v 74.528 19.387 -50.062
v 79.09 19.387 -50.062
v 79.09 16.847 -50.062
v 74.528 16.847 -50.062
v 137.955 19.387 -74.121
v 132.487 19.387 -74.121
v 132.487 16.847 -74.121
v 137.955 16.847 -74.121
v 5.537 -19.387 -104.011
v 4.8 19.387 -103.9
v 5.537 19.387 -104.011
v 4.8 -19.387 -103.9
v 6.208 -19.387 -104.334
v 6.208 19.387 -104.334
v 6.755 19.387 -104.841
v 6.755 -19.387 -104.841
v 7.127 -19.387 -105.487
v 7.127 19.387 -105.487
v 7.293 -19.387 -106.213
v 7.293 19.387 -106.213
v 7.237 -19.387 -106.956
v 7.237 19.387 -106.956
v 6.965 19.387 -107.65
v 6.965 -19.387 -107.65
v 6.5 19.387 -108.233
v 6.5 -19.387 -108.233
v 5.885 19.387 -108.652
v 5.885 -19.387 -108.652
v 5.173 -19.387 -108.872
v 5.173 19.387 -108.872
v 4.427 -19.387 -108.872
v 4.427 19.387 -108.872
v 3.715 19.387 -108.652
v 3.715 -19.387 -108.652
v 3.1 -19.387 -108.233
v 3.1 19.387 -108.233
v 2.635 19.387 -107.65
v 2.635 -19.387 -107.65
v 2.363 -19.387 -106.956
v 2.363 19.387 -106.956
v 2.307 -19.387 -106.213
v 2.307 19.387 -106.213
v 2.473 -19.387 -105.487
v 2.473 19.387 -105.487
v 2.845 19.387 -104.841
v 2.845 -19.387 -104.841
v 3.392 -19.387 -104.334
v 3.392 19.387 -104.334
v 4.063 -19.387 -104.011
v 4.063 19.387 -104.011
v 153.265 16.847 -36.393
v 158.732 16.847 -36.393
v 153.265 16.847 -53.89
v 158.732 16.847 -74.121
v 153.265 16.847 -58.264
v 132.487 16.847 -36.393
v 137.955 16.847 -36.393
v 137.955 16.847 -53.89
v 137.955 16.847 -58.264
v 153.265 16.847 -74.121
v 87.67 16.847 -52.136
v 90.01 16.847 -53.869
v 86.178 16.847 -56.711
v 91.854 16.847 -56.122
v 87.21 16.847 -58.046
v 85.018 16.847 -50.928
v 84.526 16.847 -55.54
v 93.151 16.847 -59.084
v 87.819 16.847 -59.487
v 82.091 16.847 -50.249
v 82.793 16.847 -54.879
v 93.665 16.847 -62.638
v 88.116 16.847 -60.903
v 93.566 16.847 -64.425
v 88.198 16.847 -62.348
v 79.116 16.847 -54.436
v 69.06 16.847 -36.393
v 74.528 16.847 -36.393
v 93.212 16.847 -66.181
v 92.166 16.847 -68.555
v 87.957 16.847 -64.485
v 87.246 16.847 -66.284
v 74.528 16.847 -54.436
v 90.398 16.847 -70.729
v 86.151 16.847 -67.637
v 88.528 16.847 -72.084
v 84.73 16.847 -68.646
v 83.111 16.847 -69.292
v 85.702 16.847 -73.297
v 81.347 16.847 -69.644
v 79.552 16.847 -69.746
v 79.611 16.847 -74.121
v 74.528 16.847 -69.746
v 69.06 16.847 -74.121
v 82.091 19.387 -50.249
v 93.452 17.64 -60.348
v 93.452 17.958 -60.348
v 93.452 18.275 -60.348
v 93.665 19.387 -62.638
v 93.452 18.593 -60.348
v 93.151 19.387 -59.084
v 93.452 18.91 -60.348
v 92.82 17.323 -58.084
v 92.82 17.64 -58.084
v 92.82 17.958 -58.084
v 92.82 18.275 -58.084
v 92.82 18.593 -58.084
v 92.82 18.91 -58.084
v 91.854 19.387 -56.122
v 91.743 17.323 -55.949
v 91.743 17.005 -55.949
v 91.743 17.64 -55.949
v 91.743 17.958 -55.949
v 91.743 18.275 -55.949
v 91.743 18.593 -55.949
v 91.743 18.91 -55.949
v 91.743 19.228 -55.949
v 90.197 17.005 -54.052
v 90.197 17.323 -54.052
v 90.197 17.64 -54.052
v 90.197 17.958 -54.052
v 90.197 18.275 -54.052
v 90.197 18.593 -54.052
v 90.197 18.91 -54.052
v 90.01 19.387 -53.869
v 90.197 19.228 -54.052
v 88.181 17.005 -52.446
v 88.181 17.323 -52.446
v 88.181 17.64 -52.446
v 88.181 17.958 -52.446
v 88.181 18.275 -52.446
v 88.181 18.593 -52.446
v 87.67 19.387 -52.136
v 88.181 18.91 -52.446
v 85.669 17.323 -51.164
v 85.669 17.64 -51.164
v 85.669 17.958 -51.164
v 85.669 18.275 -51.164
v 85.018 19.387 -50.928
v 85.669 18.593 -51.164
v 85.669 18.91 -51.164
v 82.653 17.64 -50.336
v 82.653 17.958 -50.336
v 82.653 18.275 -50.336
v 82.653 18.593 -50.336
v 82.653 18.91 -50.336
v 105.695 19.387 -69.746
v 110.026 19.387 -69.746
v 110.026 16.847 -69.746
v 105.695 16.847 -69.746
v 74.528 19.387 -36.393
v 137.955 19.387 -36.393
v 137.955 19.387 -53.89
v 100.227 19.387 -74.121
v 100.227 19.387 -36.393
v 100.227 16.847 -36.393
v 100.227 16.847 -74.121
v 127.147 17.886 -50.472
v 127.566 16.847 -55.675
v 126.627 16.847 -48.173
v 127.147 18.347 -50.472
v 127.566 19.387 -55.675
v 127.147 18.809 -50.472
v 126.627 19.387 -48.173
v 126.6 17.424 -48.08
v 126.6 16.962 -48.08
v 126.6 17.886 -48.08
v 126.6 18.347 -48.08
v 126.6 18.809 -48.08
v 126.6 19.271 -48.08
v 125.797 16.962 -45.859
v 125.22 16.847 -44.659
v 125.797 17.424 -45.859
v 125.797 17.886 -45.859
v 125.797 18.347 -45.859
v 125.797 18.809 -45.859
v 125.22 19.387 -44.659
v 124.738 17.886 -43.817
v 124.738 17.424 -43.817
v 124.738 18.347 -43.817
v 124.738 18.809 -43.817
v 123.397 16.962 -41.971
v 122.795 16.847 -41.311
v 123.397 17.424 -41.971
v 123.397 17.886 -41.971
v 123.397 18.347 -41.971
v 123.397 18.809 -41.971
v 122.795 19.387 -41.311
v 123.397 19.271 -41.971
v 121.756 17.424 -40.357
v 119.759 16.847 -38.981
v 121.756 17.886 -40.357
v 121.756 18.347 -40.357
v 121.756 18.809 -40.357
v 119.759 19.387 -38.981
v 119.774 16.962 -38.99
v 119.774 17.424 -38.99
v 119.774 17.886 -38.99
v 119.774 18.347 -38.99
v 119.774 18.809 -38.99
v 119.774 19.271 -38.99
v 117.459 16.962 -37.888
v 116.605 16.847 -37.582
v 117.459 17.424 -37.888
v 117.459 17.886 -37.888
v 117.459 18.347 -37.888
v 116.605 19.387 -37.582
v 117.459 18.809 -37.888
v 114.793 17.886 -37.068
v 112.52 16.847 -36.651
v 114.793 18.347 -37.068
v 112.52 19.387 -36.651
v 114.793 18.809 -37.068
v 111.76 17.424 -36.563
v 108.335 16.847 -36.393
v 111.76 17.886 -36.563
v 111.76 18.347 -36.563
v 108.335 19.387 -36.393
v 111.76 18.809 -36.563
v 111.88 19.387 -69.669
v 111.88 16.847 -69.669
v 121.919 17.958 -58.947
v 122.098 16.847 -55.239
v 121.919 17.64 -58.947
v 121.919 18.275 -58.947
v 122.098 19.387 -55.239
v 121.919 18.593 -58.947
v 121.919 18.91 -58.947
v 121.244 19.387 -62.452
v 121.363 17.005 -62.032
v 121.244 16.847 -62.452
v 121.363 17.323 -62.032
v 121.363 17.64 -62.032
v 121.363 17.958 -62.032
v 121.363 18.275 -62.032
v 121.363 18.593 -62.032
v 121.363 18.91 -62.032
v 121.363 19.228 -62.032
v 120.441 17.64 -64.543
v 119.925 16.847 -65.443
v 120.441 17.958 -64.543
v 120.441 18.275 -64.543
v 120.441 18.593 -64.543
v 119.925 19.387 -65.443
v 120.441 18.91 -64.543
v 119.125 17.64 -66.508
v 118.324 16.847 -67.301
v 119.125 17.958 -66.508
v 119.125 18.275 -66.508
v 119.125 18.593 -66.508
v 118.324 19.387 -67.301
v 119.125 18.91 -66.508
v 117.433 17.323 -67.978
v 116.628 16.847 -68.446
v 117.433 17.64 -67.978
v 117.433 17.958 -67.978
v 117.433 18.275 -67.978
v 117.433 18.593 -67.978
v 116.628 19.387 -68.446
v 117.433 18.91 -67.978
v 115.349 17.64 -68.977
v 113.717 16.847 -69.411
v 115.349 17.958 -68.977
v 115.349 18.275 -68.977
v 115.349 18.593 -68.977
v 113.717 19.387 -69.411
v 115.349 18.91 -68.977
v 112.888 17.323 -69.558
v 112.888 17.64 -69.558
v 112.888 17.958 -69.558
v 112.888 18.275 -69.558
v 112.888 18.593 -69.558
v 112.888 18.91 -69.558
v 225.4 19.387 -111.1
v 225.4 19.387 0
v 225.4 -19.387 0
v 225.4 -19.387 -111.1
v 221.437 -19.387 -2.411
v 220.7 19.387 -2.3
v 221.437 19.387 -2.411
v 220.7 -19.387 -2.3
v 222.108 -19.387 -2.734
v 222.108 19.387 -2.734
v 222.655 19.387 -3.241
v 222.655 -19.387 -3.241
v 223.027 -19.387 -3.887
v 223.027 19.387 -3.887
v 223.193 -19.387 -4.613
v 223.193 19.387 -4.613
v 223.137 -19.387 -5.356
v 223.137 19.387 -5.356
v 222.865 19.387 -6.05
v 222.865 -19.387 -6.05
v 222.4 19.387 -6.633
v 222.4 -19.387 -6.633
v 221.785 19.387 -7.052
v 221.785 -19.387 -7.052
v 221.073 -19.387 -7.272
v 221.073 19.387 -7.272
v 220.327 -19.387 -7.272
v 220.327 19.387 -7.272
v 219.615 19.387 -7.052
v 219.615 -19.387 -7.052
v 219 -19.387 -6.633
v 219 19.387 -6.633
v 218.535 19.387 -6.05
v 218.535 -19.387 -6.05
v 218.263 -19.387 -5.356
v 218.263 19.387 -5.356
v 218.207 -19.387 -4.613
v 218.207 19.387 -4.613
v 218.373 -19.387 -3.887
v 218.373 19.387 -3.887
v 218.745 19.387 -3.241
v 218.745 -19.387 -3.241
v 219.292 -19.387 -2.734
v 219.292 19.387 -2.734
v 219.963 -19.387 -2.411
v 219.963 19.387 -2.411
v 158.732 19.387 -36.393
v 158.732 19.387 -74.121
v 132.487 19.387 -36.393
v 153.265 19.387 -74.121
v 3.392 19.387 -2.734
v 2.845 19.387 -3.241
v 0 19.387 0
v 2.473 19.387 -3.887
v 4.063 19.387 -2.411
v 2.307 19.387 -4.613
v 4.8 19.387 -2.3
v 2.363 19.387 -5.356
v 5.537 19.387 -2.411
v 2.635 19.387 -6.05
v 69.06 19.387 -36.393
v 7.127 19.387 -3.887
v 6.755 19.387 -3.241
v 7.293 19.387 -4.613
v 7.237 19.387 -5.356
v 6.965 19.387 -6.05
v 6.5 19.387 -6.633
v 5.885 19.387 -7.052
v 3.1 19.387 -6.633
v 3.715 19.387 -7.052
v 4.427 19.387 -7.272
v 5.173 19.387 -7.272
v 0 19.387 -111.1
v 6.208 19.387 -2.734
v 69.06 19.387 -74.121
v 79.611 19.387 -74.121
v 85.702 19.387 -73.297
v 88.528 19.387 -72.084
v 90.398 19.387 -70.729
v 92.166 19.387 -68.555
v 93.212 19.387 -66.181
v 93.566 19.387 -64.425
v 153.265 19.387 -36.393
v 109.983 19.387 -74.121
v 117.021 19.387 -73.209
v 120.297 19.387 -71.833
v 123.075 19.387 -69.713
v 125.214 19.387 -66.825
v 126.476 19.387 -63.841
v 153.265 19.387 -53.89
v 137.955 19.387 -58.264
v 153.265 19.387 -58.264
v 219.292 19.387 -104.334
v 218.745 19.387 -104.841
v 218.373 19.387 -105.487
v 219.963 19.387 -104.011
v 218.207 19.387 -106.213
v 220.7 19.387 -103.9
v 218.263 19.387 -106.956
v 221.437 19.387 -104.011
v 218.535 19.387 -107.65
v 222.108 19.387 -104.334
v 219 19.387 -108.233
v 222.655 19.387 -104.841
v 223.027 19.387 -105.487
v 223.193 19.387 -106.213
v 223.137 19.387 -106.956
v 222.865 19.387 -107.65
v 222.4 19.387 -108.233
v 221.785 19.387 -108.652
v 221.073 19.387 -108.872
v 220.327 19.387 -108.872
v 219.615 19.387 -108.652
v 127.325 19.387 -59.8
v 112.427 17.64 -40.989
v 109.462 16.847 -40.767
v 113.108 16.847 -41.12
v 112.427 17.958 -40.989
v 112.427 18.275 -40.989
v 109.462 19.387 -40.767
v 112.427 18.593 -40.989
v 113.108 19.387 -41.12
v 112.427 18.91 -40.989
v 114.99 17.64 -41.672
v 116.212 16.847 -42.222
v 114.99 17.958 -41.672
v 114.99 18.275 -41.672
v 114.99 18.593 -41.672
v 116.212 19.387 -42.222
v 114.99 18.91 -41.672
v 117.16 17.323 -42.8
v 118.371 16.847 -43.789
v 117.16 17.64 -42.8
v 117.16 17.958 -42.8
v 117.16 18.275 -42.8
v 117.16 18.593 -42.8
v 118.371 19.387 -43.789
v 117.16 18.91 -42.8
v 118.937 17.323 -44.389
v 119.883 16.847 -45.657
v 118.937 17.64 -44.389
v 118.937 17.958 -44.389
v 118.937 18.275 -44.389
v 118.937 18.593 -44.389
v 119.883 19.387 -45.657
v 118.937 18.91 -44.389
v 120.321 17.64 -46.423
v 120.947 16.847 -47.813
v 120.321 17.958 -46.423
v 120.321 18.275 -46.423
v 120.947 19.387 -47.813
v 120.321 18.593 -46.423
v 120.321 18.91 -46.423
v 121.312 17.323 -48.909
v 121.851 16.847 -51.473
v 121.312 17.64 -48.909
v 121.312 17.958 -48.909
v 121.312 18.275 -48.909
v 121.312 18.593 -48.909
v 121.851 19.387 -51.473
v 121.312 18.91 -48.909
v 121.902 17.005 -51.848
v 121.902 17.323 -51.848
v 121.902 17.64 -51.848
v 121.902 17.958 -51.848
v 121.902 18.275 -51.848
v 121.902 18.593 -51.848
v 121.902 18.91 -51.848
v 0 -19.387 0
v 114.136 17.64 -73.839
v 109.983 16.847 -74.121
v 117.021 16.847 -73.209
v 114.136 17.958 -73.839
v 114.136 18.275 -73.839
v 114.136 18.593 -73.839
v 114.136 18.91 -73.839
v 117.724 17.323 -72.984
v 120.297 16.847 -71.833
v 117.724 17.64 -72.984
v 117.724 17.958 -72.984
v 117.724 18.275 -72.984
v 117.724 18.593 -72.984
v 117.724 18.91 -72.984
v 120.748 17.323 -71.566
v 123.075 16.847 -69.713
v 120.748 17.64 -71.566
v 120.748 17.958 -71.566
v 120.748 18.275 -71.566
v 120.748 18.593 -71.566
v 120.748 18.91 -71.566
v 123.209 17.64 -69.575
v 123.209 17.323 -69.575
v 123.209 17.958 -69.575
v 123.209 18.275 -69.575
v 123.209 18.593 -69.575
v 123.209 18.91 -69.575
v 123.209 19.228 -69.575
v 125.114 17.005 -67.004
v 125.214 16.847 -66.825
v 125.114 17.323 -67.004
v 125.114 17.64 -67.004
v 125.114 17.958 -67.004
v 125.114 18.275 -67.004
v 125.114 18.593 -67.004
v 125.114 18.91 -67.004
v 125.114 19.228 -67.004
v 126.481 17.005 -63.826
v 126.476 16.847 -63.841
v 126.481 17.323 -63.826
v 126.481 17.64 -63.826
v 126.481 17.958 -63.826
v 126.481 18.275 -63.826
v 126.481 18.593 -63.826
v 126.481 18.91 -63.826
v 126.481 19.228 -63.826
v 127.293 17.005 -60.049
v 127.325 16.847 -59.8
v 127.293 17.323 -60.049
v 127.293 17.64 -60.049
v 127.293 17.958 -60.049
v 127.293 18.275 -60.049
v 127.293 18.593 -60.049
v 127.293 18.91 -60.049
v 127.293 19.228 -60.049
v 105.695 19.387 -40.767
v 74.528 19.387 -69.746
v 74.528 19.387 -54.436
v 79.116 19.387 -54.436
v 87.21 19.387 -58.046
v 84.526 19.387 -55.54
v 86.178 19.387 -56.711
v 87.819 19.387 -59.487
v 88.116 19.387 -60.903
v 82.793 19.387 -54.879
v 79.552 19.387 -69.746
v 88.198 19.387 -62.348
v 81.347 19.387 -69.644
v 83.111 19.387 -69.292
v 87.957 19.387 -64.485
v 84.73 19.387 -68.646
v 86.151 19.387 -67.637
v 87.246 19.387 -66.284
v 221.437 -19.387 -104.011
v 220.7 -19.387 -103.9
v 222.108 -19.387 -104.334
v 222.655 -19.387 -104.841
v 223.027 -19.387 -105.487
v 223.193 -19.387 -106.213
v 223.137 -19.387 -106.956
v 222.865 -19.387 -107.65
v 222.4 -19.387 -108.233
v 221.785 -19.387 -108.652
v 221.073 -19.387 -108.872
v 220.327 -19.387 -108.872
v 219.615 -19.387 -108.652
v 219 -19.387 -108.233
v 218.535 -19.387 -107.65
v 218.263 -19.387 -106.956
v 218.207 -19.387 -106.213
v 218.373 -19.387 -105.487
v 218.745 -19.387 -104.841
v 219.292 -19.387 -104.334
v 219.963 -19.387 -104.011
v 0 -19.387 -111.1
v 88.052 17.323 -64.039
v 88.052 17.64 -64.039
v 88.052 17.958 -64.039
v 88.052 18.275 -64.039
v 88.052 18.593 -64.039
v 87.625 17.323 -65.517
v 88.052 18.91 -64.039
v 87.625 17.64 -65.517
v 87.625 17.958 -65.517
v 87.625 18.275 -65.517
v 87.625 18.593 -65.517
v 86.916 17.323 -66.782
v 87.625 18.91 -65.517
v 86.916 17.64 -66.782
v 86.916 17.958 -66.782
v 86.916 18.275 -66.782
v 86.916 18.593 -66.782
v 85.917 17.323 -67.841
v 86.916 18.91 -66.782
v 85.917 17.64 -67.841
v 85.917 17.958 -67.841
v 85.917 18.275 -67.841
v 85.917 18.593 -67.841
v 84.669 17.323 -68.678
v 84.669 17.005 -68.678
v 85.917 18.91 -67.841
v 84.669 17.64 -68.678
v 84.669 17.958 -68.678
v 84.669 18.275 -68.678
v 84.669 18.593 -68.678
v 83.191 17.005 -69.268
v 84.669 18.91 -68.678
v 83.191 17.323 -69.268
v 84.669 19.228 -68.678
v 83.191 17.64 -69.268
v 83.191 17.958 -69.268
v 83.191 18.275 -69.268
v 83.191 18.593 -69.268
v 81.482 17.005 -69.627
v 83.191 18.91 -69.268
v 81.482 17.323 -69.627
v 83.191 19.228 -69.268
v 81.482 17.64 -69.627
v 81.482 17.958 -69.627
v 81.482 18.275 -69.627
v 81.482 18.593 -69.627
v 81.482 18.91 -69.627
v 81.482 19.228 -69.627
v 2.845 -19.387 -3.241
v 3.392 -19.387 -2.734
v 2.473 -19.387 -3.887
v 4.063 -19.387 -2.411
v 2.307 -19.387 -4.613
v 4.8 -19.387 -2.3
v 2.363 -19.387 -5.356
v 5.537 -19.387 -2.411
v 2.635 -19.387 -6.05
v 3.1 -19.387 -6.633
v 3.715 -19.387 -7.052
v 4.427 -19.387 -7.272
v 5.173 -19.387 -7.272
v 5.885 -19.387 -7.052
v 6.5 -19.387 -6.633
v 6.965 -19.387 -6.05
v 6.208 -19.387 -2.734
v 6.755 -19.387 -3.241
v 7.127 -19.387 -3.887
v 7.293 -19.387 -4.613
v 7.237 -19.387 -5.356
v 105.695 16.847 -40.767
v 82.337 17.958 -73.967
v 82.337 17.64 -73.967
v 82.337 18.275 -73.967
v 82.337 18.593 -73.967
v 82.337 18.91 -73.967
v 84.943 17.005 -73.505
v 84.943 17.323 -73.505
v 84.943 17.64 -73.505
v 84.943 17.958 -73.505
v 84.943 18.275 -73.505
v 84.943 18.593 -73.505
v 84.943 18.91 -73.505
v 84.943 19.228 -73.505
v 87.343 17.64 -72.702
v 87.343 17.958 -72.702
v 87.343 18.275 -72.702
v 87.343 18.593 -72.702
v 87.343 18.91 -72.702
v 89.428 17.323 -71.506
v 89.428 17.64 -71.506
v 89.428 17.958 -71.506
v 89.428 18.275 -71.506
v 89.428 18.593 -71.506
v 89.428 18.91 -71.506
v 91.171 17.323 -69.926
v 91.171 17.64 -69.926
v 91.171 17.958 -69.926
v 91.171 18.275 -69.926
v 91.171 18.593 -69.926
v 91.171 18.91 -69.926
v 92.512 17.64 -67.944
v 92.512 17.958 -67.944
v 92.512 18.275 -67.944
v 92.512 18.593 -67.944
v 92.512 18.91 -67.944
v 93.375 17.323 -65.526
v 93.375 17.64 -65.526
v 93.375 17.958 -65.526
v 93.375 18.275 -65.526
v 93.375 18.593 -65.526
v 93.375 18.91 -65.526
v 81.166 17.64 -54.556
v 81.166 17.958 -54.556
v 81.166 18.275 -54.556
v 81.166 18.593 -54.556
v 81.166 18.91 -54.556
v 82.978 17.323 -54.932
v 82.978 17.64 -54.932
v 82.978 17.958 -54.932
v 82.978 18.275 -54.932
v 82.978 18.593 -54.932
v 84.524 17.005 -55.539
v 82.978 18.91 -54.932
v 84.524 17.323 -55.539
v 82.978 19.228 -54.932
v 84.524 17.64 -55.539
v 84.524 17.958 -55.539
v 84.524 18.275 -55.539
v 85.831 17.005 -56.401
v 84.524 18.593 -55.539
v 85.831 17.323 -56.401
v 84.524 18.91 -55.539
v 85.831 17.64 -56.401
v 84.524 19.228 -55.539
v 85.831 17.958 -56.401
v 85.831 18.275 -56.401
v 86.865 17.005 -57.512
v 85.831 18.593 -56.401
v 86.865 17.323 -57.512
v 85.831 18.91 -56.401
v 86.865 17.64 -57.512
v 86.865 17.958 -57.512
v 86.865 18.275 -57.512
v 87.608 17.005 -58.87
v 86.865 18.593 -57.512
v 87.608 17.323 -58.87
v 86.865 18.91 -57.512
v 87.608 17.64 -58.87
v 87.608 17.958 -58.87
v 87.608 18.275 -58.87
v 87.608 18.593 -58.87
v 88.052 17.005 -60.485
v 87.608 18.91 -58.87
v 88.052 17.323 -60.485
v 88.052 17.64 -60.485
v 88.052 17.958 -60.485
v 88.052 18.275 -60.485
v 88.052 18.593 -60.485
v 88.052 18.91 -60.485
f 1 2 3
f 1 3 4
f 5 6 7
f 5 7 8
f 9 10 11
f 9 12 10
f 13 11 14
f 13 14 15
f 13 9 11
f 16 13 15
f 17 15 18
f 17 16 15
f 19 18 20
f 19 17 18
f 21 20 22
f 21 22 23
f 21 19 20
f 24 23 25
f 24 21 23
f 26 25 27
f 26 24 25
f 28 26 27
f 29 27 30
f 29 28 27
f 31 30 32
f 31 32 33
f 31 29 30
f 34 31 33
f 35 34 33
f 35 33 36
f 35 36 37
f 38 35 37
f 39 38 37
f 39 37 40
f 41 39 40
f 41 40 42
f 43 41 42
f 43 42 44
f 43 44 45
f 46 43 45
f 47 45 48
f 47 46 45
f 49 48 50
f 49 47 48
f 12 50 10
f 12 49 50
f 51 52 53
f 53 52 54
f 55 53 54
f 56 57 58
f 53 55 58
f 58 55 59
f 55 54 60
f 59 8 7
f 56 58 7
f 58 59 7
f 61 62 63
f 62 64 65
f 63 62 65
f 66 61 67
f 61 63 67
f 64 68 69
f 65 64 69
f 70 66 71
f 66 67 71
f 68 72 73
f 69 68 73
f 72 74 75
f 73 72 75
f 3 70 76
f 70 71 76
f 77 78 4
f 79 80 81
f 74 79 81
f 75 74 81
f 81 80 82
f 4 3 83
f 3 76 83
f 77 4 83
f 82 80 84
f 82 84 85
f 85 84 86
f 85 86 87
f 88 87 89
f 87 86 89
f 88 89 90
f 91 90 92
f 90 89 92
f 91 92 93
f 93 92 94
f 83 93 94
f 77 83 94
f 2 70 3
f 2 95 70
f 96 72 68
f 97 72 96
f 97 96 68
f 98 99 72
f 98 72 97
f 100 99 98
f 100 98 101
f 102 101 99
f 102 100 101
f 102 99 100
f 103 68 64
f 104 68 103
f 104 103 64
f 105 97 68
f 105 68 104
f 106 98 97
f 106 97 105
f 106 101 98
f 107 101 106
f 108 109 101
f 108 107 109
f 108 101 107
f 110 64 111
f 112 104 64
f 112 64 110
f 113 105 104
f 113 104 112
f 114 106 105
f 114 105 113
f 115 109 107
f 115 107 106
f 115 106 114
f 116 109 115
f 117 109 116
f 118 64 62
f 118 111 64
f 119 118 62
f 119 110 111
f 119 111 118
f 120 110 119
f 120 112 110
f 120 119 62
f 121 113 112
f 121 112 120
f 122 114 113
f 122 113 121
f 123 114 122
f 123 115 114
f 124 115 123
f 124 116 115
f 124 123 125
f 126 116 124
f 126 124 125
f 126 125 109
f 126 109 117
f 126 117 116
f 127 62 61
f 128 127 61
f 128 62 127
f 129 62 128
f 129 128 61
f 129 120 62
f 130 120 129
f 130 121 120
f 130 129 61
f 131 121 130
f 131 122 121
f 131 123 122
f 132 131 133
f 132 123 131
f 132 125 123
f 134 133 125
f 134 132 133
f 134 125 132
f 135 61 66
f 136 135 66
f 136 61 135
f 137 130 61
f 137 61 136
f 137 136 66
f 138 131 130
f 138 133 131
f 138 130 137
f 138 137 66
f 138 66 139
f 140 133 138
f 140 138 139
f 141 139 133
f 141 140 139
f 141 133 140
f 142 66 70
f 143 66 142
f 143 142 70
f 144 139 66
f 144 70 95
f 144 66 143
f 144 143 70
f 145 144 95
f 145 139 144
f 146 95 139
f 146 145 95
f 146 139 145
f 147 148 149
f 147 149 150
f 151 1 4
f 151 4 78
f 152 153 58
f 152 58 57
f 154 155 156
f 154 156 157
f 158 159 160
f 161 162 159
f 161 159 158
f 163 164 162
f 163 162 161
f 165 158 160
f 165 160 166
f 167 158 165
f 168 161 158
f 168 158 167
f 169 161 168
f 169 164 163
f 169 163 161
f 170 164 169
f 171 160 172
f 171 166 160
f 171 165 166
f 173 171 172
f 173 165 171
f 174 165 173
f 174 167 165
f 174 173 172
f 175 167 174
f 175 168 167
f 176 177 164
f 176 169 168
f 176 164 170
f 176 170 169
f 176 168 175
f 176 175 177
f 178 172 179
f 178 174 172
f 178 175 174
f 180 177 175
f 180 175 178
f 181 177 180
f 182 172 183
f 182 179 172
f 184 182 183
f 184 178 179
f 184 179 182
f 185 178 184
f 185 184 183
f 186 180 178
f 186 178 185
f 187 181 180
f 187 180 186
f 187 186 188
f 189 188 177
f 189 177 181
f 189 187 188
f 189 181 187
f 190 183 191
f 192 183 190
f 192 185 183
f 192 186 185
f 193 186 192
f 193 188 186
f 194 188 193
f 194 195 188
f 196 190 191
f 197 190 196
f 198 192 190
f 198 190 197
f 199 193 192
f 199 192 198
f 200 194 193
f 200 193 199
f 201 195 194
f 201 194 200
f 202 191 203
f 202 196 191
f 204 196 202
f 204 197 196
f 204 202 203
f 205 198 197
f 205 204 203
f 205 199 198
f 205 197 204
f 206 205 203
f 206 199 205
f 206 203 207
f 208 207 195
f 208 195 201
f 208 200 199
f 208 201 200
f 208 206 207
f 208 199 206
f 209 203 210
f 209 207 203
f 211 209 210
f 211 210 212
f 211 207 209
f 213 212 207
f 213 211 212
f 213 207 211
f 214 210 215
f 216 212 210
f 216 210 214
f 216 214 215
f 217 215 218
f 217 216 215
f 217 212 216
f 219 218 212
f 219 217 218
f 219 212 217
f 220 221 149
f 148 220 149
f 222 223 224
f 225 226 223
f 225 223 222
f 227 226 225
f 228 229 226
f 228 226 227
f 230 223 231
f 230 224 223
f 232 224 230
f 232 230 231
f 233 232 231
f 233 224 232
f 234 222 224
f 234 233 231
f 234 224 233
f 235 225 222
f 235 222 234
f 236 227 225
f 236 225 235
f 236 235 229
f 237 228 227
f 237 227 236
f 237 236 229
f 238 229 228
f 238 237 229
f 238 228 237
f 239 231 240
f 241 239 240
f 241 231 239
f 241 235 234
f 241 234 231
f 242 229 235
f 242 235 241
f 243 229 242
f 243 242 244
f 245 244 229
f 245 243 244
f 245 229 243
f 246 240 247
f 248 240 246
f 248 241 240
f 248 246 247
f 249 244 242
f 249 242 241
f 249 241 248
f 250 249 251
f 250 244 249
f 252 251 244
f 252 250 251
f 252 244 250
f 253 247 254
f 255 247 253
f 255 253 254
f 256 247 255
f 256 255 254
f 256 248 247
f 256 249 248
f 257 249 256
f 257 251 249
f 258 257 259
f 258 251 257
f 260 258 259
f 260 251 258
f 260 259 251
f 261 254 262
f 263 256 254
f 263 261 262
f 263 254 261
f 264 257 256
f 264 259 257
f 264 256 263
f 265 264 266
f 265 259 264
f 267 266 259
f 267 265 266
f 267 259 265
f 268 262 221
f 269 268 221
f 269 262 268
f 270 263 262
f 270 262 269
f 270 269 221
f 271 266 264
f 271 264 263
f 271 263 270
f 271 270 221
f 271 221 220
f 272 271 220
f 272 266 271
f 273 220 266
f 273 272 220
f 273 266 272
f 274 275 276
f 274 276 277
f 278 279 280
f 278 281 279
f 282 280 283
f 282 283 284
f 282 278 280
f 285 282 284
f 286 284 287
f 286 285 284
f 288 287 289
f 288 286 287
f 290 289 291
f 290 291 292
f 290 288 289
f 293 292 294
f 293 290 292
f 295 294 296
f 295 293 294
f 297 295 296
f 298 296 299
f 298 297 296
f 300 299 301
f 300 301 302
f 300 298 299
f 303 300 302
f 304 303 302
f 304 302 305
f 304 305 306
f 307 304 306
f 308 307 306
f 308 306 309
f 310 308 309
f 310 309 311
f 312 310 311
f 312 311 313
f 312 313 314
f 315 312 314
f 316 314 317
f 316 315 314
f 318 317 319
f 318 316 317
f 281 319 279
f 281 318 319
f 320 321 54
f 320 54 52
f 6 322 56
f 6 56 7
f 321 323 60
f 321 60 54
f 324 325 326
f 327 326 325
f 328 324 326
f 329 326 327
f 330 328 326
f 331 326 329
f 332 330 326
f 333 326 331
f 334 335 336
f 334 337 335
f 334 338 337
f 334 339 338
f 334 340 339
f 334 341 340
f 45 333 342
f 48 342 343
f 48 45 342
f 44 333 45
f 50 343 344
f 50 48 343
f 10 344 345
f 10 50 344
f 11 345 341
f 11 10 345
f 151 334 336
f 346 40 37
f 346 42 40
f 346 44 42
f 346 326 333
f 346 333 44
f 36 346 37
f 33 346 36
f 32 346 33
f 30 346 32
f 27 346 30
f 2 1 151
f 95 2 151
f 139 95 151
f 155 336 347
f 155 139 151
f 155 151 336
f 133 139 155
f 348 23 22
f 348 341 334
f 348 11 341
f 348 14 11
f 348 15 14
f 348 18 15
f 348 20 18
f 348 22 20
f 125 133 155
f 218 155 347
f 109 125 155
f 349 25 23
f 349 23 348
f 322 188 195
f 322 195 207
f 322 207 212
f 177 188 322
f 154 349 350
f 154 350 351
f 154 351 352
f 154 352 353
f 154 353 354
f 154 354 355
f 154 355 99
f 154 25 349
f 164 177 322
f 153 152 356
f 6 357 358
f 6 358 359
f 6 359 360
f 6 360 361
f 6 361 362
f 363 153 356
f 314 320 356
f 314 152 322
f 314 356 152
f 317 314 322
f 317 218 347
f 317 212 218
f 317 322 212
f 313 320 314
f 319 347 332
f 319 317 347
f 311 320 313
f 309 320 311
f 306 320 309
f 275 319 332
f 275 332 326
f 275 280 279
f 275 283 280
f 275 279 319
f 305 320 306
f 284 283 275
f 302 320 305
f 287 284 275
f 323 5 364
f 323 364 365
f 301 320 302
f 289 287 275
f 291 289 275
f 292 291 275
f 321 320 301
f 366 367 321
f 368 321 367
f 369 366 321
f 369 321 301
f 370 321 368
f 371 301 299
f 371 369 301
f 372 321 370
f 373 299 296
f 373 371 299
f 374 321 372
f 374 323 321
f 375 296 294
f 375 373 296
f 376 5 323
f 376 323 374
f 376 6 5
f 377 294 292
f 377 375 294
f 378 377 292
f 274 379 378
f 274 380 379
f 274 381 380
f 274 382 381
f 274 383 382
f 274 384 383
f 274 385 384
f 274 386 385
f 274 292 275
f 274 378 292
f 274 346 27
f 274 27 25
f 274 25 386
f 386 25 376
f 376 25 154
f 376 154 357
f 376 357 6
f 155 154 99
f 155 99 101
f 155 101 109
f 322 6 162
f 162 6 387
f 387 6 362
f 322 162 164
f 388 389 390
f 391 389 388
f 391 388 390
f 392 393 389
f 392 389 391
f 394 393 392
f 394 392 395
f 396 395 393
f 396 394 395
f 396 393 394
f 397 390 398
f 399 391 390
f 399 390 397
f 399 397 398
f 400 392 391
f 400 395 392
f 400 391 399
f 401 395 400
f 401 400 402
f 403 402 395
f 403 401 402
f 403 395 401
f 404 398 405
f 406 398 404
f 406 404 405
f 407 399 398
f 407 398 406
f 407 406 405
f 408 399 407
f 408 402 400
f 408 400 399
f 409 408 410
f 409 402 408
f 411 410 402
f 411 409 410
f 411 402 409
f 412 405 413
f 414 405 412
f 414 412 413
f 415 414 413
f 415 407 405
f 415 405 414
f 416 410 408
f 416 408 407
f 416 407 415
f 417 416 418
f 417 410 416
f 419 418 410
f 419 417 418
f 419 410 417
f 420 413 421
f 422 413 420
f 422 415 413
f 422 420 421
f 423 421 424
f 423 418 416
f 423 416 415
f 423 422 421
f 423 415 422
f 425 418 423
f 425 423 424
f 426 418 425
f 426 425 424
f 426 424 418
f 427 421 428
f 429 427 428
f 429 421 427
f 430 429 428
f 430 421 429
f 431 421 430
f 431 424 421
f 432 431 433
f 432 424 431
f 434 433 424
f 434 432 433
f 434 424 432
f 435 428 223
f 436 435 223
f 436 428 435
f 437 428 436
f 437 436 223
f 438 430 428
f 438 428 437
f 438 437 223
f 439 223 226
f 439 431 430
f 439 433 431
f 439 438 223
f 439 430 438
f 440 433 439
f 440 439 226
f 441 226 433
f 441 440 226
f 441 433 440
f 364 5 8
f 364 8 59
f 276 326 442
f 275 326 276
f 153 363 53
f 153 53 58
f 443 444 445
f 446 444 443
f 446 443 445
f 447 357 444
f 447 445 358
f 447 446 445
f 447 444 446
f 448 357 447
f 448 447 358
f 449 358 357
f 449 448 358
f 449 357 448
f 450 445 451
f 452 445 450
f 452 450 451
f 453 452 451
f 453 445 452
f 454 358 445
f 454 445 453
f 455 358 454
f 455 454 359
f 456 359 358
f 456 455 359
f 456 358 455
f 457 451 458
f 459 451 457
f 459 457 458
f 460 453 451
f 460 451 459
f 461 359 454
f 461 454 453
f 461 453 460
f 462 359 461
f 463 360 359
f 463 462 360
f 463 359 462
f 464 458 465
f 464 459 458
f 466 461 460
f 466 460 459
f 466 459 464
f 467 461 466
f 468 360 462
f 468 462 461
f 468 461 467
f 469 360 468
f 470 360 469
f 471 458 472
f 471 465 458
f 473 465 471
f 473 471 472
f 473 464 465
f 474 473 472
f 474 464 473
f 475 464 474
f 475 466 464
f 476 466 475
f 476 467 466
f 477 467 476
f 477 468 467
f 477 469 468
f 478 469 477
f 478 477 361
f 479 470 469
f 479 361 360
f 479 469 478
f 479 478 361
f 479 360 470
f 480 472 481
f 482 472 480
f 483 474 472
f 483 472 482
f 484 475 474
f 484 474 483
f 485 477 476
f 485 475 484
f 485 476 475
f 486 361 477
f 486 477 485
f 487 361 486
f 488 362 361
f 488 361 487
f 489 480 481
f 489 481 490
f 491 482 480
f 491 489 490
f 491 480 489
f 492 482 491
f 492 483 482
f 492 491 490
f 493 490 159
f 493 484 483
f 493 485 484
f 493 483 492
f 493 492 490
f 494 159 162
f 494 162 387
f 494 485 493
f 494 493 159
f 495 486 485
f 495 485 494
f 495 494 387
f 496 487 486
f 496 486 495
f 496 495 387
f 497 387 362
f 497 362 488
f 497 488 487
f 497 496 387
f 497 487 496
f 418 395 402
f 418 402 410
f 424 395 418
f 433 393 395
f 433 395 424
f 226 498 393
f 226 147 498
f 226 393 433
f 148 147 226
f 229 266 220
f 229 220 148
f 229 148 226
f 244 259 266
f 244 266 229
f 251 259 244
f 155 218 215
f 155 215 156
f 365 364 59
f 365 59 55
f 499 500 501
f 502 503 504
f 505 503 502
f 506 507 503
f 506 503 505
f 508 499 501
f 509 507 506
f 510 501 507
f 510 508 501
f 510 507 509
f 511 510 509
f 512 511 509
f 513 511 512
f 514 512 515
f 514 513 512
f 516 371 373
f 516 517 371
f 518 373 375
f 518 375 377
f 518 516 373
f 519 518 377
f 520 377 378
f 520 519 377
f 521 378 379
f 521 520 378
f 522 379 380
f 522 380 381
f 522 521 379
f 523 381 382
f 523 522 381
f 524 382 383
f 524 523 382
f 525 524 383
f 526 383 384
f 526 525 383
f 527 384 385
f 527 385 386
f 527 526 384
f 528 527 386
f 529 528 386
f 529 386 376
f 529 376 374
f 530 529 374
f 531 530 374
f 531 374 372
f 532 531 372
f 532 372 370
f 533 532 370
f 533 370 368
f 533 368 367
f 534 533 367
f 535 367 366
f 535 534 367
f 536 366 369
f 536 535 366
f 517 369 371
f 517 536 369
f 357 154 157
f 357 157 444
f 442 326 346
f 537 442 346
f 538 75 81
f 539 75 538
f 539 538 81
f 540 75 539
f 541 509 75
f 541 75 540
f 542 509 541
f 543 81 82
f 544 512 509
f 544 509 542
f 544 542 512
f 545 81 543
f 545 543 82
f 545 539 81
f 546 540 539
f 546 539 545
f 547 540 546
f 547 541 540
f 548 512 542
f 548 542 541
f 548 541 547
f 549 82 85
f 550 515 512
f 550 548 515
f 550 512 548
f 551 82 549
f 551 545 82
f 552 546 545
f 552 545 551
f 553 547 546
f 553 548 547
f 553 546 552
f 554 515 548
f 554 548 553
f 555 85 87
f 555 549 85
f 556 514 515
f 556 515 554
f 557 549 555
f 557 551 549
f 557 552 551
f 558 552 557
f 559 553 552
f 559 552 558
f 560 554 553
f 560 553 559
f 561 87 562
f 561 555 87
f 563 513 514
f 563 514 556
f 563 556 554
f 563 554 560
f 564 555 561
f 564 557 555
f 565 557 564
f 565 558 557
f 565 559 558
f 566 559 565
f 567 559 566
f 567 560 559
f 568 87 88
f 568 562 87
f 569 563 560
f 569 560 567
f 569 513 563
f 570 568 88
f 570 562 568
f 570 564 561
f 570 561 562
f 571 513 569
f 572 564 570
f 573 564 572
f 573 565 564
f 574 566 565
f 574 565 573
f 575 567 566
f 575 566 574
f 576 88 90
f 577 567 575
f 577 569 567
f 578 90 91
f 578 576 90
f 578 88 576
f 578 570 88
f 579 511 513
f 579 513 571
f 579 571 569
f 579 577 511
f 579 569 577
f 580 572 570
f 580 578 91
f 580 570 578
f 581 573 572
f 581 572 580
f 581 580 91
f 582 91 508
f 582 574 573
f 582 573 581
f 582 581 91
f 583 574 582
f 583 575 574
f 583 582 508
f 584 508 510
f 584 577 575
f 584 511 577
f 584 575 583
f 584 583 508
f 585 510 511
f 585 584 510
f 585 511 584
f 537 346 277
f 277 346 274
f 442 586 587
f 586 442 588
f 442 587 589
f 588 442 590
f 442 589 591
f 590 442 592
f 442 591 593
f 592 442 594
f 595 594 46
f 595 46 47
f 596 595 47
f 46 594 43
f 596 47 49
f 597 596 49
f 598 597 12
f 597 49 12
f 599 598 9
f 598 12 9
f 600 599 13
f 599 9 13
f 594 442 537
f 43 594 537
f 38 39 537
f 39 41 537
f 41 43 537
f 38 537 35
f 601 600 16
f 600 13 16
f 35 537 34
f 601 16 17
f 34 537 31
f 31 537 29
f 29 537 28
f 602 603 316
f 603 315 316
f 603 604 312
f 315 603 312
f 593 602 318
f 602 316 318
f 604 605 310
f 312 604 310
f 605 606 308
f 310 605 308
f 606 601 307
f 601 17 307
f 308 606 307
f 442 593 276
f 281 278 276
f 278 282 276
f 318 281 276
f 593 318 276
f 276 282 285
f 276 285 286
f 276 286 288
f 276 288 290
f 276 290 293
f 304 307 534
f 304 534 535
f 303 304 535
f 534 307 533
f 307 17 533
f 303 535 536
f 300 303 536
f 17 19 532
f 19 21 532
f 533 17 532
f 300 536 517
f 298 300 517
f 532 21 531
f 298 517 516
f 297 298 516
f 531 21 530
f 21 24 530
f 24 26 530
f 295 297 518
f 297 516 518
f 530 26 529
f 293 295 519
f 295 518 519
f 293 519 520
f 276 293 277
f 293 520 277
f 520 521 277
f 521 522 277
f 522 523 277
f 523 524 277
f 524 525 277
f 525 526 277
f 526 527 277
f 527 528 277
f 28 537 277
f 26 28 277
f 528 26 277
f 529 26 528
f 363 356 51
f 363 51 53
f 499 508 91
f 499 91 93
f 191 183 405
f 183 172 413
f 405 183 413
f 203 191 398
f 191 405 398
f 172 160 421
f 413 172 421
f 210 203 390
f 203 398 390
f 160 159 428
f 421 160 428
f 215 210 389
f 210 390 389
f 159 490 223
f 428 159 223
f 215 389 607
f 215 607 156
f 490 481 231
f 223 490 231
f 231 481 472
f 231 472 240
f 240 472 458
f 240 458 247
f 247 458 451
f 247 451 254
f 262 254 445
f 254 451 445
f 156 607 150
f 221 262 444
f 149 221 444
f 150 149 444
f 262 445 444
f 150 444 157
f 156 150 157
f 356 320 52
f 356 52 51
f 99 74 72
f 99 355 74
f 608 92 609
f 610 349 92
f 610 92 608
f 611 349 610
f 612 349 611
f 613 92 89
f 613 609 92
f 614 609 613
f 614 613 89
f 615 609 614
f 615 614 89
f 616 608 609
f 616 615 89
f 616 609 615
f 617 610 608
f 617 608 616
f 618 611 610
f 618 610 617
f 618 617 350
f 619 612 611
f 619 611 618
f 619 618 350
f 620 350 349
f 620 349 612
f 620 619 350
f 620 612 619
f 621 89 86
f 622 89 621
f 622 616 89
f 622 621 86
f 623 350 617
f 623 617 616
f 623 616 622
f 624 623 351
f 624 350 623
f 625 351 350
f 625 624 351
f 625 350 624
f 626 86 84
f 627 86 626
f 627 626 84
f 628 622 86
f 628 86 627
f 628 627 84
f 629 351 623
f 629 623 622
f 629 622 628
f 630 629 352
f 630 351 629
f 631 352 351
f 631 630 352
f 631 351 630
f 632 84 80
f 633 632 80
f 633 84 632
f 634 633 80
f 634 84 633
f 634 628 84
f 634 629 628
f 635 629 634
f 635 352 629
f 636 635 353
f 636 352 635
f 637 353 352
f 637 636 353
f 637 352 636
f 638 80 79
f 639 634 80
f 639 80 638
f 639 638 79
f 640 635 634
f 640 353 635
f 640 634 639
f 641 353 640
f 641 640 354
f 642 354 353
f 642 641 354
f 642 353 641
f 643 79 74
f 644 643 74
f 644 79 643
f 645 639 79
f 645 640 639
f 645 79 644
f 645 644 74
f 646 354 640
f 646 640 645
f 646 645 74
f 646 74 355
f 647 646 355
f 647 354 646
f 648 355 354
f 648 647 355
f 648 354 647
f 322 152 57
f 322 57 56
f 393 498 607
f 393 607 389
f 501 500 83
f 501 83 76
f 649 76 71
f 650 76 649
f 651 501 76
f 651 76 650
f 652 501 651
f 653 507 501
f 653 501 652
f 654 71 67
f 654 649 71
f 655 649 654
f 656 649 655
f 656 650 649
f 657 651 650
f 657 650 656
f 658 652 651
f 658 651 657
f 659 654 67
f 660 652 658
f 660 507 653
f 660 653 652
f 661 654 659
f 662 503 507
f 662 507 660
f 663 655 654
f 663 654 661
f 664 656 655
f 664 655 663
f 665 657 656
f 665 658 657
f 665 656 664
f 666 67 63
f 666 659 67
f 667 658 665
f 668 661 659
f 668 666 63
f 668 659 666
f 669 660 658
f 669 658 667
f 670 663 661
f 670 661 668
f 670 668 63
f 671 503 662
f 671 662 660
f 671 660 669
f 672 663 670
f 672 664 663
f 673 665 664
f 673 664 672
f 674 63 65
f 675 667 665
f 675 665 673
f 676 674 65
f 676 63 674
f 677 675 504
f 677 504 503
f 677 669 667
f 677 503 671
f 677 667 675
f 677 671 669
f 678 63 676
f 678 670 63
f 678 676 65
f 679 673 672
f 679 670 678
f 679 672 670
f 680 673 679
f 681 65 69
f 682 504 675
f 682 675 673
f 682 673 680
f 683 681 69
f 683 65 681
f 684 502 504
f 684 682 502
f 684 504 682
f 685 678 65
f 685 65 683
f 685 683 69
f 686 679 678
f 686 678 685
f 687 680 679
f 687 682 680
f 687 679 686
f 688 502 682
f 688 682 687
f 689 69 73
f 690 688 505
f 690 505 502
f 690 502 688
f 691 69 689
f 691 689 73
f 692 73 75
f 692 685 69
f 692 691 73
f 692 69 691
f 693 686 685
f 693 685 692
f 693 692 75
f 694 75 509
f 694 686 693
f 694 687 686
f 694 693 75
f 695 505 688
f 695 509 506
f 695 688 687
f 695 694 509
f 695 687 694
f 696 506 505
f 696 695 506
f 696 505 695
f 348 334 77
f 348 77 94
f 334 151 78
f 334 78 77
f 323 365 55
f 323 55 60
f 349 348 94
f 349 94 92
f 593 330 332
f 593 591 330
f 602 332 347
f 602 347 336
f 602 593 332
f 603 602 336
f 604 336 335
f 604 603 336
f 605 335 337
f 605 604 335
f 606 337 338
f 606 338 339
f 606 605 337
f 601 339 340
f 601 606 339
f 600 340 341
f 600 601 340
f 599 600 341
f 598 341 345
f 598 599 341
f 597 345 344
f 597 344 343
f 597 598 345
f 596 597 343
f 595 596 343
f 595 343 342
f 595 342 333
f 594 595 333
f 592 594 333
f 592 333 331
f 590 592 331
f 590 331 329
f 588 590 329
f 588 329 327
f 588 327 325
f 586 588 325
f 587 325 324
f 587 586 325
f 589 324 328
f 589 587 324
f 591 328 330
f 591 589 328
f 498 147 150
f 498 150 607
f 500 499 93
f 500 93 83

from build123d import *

# Parameters (mm, degrees)
SKETCH1_W           = 225.40000005
SKETCH1_H           = 111.10000005
SKETCH1_R           = 2.499999953
BOSS_EXTRUDE1_DEPTH = 19.38655
CUT_EXTRUDE1_DEPTH  = 2.54


with BuildPart() as part:
    # Sketch1 → Boss-Extrude1 (new, symmetric)
    with BuildSketch(Plane(origin=(0, 0, 0), x_dir=(1, 0, 0), z_dir=(0, 1, 0))):
        with Locations((112.700000025, 55.550000025)):
            Rectangle(SKETCH1_W, SKETCH1_H)
        with Locations(Location((4.800000052, 4.800000052, 0), (0, 0, 270))):
            Circle(SKETCH1_R, mode=Mode.SUBTRACT)
        with Locations(Location((4.800000052, 106.400000052, 0), (0, 0, 270))):
            Circle(SKETCH1_R, mode=Mode.SUBTRACT)
        with Locations(Location((220.700000052, 106.400000052, 0), (0, 0, 270))):
            Circle(SKETCH1_R, mode=Mode.SUBTRACT)
        with Locations(Location((220.700000052, 4.800000052, 0), (0, 0, 270))):
            Circle(SKETCH1_R, mode=Mode.SUBTRACT)
    extrude(amount=BOSS_EXTRUDE1_DEPTH, both=True)

    # Sketch2 → Cut-Extrude1 (cut)
    # profile 1 of 3: a face of its own
    with BuildSketch(Plane(origin=(0, 19.38655, 0), x_dir=(1, 0, 0), z_dir=(0, 1, 0))):
        with BuildLine():
            add(Edge.make_bspline(
                [(93.6654446, 62.638119725), (93.65621175, 62.255926888), (93.637663033, 61.488104777), (93.466421809, 60.341834085), (93.201255703, 59.201705874), (92.836997723, 58.075217304), (92.359286935, 56.979010165), (91.762331794, 55.932624231), (91.032595392, 54.955716054), (90.207106522, 54.027487516), (89.252652089, 53.179116743), (88.173798237, 52.414727304), (86.973600637, 51.734204765), (85.655660468, 51.128628725), (84.202701193, 50.653409294), (82.618753702, 50.300761726), (80.898189452, 50.099121533), (79.705954978, 50.07473573), (79.09029785, 50.062143162)],
                knots=[0, 0, 0, 0, 0.84837333, 1.704374698, 2.568122001, 3.446177459, 4.329841521, 5.219461111, 6.115085959, 7.03322926, 7.973947317, 8.94447037, 9.964314875, 11.034235969, 12.160282575, 13.352588404, 14.632904974, 16, 16, 16, 16], degree=3))
            Line((79.09029785, 50.062143162), (74.528088962, 50.062143162))
            Line((74.528088962, 50.062143162), (74.528088962, 36.39260342))
            Line((74.528088962, 36.39260342), (69.060273065, 36.39260342))
            Line((69.060273065, 36.39260342), (69.060273065, 74.120533108))
            Line((69.060273065, 74.120533108), (79.611449053, 74.120533108))
            add(Edge.make_bspline(
                [(79.611449053, 74.120533108), (80.070260309, 74.115673927), (80.980958213, 74.106028903), (82.329353652, 73.976911734), (83.651671763, 73.795021467), (84.937147693, 73.523102459), (86.171480276, 73.166358976), (87.344146306, 72.730911072), (88.422755699, 72.162952721), (89.43560104, 71.526521333), (90.368402205, 70.791840353), (91.189022047, 69.939252772), (91.912770344, 68.989458848), (92.539599198, 67.944691466), (93.055694596, 66.787250357), (93.402550005, 65.504823346), (93.635402669, 64.110350409), (93.655195832, 63.140369447), (93.6654446, 62.638119725)],
                knots=[0, 0, 0, 0, 1.071095419, 2.126025337, 3.160633674, 4.187194637, 5.191188192, 6.159546808, 7.102471747, 8.032359578, 8.950543616, 9.867691343, 10.788184798, 11.733733012, 12.707489344, 13.737062018, 14.82826569, 16, 16, 16, 16], degree=3))
        make_face()
        with BuildLine():
            add(Edge.make_bspline(
                [(88.197628703, 62.347642005), (88.192174404, 62.63850916), (88.18154377, 63.205420092), (88.067270065, 64.026417972), (87.887321266, 64.795998376), (87.642204989, 65.513494356), (87.324445545, 66.181041679), (86.9271256, 66.789508742), (86.462833318, 67.351595169), (85.92370252, 67.854044286), (85.320326107, 68.296325862), (84.670815804, 68.696121206), (83.954231053, 69.019190265), (83.180431142, 69.281086893), (82.353689397, 69.498799431), (81.465989989, 69.635809834), (80.527957319, 69.737538529), (79.882297045, 69.743319744), (79.551644817, 69.74628039)],
                knots=[0, 0, 0, 0, 1.07893025, 2.102875295, 3.069403633, 4.00867391, 4.911619206, 5.805799344, 6.69897942, 7.61127936, 8.532960211, 9.47193309, 10.436783978, 11.442898866, 12.50165651, 13.605056338, 14.773513735, 16, 16, 16, 16], degree=3))
            Line((79.551644817, 69.74628039), (74.528088962, 69.74628039))
            Line((74.528088962, 69.74628039), (74.528088962, 54.43639588))
            Line((74.528088962, 54.43639588), (79.115928237, 54.43639588))
            add(Edge.make_bspline(
                [(79.115928237, 54.43639588), (79.469215163, 54.444058583), (80.154049634, 54.458912469), (81.153694325, 54.542163566), (82.091850755, 54.691905292), (82.964265919, 54.917155421), (83.774695488, 55.18910777), (84.524586407, 55.521306188), (85.210072438, 55.925895812), (85.836535364, 56.387055958), (86.399655255, 56.909209561), (86.877940326, 57.506401351), (87.291847487, 58.157818385), (87.628287432, 58.875259995), (87.880108968, 59.657394144), (88.069138486, 60.497611643), (88.18153711, 61.401962584), (88.192147378, 62.025512532), (88.197628703, 62.347642005)],
                knots=[0, 0, 0, 0, 1.232805628, 2.389751021, 3.4973379, 4.54330244, 5.530003372, 6.477393866, 7.399377973, 8.301660217, 9.187431021, 10.070466494, 10.963674817, 11.874940633, 12.827061481, 13.825105319, 14.876436953, 16, 16, 16, 16], degree=3))
        make_face(mode=Mode.SUBTRACT)
    # profile 2 of 3: a face of its own
    with BuildSketch(Plane(origin=(0, 19.38655, 0), x_dir=(1, 0, 0), z_dir=(0, 1, 0))):
        with BuildLine():
            add(Edge.make_bspline(
                [(127.56590316, 55.675197919), (127.547617612, 54.78857119), (127.511689457, 53.046492477), (127.23969054, 50.905769989), (126.922569652, 49.262016243), (126.614411717, 48.087206761), (126.246431872, 46.950715858), (125.811824352, 45.860819894), (125.314265868, 44.812615172), (124.753130965, 43.8086857), (124.107420568, 42.863739226), (123.409082848, 41.959258432), (122.626828334, 41.117422828), (121.7596775, 40.338177311), (120.809466051, 39.618619159), (119.771337822, 38.967548349), (118.647283346, 38.391422091), (117.447711896, 37.861858683), (116.153140186, 37.424384305), (114.773384937, 37.046415803), (113.301688648, 36.744518404), (111.730514486, 36.548407326), (110.065508535, 36.414654635), (108.921503761, 36.400080642), (108.334569436, 36.39260342)],
                knots=[0, 0, 0, 0, 1.874627119, 3.68334034, 4.55511198, 5.414139205, 6.25033141, 7.080252411, 7.893905149, 8.703019486, 9.509911256, 10.312362027, 11.117881282, 11.936734267, 12.775179546, 13.635831221, 14.524848569, 15.444673208, 16.406604644, 17.411911457, 18.469143348, 19.580838344, 20.758843452, 22, 22, 22, 22], degree=3))
            Line((108.334569436, 36.39260342), (100.226823676, 36.39260342))
            Line((100.226823676, 36.39260342), (100.226823676, 74.120533108))
            Line((100.226823676, 74.120533108), (109.983457667, 74.120533108))
            add(Edge.make_bspline(
                [(109.983457667, 74.120533108), (110.698796565, 74.108775888), (112.087312401, 74.085954417), (114.099407103, 73.871359676), (115.971010991, 73.513186255), (117.705932553, 73.024742171), (119.296694788, 72.37897733), (120.753078111, 71.603929555), (122.063935524, 70.672214529), (123.234870408, 69.595919293), (124.268375898, 68.375042443), (125.15212849, 66.998343044), (125.905974417, 65.477332321), (126.520334079, 63.804439371), (126.984079723, 61.979297568), (127.323005556, 60.011417912), (127.529971236, 57.892365797), (127.553664927, 56.430354144), (127.56590316, 55.675197919)],
                knots=[0, 0, 0, 0, 1.17177347, 2.274482801, 3.310388109, 4.291013938, 5.222472681, 6.118087065, 6.988127256, 7.850034114, 8.717518086, 9.601485366, 10.523818561, 11.493740021, 12.515690363, 13.604990885, 14.762933224, 16, 16, 16, 16], degree=3))
        make_face()
        with BuildLine():
            add(Edge.make_bspline(
                [(122.098087263, 55.239481339), (122.091167759, 55.883338842), (122.07786261, 57.121378364), (121.941863816, 58.899207539), (121.714490077, 60.523833747), (121.395141619, 62.00003254), (120.973701982, 63.330931753), (120.478179626, 64.534888844), (119.856705316, 65.588603714), (119.150728012, 66.521049001), (118.340699821, 67.317635038), (117.439068976, 68.005524695), (116.438452675, 68.568612468), (115.337592989, 69.003716428), (114.147410598, 69.331977904), (112.863376849, 69.585308184), (111.475458259, 69.713259964), (110.519060263, 69.735050507), (110.026174979, 69.74628039)],
                knots=[0, 0, 0, 0, 1.413547595, 2.71803587, 3.911871408, 5.013341294, 6.029850817, 6.974090411, 7.865305992, 8.708270035, 9.535123508, 10.351794371, 11.191784495, 12.047569406, 12.944296091, 13.8996306, 14.91756238, 16, 16, 16, 16], degree=3))
            Line((110.026174979, 69.74628039), (105.694639573, 69.74628039))
            Line((105.694639573, 69.74628039), (105.694639573, 40.766856138))
            Line((105.694639573, 40.766856138), (109.462306464, 40.766856138))
            add(Edge.make_bspline(
                [(109.462306464, 40.766856138), (109.972390662, 40.779628967), (110.963897054, 40.804456912), (112.404673192, 40.959074575), (113.741396992, 41.254449715), (114.982492322, 41.645412228), (116.128283102, 42.146846942), (117.168651881, 42.778873861), (118.119824521, 43.514260641), (118.95603885, 44.379608434), (119.710984868, 45.341779056), (120.348177326, 46.429272224), (120.897700383, 47.621563924), (121.340339899, 48.927882581), (121.678563879, 50.347150333), (121.924720399, 51.877582623), (122.068484344, 53.522343822), (122.088017719, 54.655390557), (122.098087263, 55.239481339)],
                knots=[0, 0, 0, 0, 1.112402768, 2.162298815, 3.153767855, 4.092494856, 4.996014567, 5.873553179, 6.740614794, 7.610074679, 8.4907496, 9.401305331, 10.351566166, 11.349161427, 12.403455731, 13.529502205, 14.72644707, 16, 16, 16, 16], degree=3))
        make_face(mode=Mode.SUBTRACT)
    # profile 3 of 3: a face of its own
    with BuildSketch(Plane(origin=(0, 19.38655, 0), x_dir=(1, 0, 0), z_dir=(0, 1, 0))):
        Polygon((158.732453771, 36.39260342), (153.264637875, 36.39260342), (153.264637875, 53.88961429), (137.954753364, 53.88961429), (137.954753364, 36.39260342), (132.486937467, 36.39260342), (132.486937467, 74.120533108), (137.954753364, 74.120533108), (137.954753364, 58.263867007), (153.264637875, 58.263867007), (153.264637875, 74.120533108), (158.732453771, 74.120533108), align=None)
    extrude(amount=-CUT_EXTRUDE1_DEPTH, mode=Mode.SUBTRACT)


solid = part.part
